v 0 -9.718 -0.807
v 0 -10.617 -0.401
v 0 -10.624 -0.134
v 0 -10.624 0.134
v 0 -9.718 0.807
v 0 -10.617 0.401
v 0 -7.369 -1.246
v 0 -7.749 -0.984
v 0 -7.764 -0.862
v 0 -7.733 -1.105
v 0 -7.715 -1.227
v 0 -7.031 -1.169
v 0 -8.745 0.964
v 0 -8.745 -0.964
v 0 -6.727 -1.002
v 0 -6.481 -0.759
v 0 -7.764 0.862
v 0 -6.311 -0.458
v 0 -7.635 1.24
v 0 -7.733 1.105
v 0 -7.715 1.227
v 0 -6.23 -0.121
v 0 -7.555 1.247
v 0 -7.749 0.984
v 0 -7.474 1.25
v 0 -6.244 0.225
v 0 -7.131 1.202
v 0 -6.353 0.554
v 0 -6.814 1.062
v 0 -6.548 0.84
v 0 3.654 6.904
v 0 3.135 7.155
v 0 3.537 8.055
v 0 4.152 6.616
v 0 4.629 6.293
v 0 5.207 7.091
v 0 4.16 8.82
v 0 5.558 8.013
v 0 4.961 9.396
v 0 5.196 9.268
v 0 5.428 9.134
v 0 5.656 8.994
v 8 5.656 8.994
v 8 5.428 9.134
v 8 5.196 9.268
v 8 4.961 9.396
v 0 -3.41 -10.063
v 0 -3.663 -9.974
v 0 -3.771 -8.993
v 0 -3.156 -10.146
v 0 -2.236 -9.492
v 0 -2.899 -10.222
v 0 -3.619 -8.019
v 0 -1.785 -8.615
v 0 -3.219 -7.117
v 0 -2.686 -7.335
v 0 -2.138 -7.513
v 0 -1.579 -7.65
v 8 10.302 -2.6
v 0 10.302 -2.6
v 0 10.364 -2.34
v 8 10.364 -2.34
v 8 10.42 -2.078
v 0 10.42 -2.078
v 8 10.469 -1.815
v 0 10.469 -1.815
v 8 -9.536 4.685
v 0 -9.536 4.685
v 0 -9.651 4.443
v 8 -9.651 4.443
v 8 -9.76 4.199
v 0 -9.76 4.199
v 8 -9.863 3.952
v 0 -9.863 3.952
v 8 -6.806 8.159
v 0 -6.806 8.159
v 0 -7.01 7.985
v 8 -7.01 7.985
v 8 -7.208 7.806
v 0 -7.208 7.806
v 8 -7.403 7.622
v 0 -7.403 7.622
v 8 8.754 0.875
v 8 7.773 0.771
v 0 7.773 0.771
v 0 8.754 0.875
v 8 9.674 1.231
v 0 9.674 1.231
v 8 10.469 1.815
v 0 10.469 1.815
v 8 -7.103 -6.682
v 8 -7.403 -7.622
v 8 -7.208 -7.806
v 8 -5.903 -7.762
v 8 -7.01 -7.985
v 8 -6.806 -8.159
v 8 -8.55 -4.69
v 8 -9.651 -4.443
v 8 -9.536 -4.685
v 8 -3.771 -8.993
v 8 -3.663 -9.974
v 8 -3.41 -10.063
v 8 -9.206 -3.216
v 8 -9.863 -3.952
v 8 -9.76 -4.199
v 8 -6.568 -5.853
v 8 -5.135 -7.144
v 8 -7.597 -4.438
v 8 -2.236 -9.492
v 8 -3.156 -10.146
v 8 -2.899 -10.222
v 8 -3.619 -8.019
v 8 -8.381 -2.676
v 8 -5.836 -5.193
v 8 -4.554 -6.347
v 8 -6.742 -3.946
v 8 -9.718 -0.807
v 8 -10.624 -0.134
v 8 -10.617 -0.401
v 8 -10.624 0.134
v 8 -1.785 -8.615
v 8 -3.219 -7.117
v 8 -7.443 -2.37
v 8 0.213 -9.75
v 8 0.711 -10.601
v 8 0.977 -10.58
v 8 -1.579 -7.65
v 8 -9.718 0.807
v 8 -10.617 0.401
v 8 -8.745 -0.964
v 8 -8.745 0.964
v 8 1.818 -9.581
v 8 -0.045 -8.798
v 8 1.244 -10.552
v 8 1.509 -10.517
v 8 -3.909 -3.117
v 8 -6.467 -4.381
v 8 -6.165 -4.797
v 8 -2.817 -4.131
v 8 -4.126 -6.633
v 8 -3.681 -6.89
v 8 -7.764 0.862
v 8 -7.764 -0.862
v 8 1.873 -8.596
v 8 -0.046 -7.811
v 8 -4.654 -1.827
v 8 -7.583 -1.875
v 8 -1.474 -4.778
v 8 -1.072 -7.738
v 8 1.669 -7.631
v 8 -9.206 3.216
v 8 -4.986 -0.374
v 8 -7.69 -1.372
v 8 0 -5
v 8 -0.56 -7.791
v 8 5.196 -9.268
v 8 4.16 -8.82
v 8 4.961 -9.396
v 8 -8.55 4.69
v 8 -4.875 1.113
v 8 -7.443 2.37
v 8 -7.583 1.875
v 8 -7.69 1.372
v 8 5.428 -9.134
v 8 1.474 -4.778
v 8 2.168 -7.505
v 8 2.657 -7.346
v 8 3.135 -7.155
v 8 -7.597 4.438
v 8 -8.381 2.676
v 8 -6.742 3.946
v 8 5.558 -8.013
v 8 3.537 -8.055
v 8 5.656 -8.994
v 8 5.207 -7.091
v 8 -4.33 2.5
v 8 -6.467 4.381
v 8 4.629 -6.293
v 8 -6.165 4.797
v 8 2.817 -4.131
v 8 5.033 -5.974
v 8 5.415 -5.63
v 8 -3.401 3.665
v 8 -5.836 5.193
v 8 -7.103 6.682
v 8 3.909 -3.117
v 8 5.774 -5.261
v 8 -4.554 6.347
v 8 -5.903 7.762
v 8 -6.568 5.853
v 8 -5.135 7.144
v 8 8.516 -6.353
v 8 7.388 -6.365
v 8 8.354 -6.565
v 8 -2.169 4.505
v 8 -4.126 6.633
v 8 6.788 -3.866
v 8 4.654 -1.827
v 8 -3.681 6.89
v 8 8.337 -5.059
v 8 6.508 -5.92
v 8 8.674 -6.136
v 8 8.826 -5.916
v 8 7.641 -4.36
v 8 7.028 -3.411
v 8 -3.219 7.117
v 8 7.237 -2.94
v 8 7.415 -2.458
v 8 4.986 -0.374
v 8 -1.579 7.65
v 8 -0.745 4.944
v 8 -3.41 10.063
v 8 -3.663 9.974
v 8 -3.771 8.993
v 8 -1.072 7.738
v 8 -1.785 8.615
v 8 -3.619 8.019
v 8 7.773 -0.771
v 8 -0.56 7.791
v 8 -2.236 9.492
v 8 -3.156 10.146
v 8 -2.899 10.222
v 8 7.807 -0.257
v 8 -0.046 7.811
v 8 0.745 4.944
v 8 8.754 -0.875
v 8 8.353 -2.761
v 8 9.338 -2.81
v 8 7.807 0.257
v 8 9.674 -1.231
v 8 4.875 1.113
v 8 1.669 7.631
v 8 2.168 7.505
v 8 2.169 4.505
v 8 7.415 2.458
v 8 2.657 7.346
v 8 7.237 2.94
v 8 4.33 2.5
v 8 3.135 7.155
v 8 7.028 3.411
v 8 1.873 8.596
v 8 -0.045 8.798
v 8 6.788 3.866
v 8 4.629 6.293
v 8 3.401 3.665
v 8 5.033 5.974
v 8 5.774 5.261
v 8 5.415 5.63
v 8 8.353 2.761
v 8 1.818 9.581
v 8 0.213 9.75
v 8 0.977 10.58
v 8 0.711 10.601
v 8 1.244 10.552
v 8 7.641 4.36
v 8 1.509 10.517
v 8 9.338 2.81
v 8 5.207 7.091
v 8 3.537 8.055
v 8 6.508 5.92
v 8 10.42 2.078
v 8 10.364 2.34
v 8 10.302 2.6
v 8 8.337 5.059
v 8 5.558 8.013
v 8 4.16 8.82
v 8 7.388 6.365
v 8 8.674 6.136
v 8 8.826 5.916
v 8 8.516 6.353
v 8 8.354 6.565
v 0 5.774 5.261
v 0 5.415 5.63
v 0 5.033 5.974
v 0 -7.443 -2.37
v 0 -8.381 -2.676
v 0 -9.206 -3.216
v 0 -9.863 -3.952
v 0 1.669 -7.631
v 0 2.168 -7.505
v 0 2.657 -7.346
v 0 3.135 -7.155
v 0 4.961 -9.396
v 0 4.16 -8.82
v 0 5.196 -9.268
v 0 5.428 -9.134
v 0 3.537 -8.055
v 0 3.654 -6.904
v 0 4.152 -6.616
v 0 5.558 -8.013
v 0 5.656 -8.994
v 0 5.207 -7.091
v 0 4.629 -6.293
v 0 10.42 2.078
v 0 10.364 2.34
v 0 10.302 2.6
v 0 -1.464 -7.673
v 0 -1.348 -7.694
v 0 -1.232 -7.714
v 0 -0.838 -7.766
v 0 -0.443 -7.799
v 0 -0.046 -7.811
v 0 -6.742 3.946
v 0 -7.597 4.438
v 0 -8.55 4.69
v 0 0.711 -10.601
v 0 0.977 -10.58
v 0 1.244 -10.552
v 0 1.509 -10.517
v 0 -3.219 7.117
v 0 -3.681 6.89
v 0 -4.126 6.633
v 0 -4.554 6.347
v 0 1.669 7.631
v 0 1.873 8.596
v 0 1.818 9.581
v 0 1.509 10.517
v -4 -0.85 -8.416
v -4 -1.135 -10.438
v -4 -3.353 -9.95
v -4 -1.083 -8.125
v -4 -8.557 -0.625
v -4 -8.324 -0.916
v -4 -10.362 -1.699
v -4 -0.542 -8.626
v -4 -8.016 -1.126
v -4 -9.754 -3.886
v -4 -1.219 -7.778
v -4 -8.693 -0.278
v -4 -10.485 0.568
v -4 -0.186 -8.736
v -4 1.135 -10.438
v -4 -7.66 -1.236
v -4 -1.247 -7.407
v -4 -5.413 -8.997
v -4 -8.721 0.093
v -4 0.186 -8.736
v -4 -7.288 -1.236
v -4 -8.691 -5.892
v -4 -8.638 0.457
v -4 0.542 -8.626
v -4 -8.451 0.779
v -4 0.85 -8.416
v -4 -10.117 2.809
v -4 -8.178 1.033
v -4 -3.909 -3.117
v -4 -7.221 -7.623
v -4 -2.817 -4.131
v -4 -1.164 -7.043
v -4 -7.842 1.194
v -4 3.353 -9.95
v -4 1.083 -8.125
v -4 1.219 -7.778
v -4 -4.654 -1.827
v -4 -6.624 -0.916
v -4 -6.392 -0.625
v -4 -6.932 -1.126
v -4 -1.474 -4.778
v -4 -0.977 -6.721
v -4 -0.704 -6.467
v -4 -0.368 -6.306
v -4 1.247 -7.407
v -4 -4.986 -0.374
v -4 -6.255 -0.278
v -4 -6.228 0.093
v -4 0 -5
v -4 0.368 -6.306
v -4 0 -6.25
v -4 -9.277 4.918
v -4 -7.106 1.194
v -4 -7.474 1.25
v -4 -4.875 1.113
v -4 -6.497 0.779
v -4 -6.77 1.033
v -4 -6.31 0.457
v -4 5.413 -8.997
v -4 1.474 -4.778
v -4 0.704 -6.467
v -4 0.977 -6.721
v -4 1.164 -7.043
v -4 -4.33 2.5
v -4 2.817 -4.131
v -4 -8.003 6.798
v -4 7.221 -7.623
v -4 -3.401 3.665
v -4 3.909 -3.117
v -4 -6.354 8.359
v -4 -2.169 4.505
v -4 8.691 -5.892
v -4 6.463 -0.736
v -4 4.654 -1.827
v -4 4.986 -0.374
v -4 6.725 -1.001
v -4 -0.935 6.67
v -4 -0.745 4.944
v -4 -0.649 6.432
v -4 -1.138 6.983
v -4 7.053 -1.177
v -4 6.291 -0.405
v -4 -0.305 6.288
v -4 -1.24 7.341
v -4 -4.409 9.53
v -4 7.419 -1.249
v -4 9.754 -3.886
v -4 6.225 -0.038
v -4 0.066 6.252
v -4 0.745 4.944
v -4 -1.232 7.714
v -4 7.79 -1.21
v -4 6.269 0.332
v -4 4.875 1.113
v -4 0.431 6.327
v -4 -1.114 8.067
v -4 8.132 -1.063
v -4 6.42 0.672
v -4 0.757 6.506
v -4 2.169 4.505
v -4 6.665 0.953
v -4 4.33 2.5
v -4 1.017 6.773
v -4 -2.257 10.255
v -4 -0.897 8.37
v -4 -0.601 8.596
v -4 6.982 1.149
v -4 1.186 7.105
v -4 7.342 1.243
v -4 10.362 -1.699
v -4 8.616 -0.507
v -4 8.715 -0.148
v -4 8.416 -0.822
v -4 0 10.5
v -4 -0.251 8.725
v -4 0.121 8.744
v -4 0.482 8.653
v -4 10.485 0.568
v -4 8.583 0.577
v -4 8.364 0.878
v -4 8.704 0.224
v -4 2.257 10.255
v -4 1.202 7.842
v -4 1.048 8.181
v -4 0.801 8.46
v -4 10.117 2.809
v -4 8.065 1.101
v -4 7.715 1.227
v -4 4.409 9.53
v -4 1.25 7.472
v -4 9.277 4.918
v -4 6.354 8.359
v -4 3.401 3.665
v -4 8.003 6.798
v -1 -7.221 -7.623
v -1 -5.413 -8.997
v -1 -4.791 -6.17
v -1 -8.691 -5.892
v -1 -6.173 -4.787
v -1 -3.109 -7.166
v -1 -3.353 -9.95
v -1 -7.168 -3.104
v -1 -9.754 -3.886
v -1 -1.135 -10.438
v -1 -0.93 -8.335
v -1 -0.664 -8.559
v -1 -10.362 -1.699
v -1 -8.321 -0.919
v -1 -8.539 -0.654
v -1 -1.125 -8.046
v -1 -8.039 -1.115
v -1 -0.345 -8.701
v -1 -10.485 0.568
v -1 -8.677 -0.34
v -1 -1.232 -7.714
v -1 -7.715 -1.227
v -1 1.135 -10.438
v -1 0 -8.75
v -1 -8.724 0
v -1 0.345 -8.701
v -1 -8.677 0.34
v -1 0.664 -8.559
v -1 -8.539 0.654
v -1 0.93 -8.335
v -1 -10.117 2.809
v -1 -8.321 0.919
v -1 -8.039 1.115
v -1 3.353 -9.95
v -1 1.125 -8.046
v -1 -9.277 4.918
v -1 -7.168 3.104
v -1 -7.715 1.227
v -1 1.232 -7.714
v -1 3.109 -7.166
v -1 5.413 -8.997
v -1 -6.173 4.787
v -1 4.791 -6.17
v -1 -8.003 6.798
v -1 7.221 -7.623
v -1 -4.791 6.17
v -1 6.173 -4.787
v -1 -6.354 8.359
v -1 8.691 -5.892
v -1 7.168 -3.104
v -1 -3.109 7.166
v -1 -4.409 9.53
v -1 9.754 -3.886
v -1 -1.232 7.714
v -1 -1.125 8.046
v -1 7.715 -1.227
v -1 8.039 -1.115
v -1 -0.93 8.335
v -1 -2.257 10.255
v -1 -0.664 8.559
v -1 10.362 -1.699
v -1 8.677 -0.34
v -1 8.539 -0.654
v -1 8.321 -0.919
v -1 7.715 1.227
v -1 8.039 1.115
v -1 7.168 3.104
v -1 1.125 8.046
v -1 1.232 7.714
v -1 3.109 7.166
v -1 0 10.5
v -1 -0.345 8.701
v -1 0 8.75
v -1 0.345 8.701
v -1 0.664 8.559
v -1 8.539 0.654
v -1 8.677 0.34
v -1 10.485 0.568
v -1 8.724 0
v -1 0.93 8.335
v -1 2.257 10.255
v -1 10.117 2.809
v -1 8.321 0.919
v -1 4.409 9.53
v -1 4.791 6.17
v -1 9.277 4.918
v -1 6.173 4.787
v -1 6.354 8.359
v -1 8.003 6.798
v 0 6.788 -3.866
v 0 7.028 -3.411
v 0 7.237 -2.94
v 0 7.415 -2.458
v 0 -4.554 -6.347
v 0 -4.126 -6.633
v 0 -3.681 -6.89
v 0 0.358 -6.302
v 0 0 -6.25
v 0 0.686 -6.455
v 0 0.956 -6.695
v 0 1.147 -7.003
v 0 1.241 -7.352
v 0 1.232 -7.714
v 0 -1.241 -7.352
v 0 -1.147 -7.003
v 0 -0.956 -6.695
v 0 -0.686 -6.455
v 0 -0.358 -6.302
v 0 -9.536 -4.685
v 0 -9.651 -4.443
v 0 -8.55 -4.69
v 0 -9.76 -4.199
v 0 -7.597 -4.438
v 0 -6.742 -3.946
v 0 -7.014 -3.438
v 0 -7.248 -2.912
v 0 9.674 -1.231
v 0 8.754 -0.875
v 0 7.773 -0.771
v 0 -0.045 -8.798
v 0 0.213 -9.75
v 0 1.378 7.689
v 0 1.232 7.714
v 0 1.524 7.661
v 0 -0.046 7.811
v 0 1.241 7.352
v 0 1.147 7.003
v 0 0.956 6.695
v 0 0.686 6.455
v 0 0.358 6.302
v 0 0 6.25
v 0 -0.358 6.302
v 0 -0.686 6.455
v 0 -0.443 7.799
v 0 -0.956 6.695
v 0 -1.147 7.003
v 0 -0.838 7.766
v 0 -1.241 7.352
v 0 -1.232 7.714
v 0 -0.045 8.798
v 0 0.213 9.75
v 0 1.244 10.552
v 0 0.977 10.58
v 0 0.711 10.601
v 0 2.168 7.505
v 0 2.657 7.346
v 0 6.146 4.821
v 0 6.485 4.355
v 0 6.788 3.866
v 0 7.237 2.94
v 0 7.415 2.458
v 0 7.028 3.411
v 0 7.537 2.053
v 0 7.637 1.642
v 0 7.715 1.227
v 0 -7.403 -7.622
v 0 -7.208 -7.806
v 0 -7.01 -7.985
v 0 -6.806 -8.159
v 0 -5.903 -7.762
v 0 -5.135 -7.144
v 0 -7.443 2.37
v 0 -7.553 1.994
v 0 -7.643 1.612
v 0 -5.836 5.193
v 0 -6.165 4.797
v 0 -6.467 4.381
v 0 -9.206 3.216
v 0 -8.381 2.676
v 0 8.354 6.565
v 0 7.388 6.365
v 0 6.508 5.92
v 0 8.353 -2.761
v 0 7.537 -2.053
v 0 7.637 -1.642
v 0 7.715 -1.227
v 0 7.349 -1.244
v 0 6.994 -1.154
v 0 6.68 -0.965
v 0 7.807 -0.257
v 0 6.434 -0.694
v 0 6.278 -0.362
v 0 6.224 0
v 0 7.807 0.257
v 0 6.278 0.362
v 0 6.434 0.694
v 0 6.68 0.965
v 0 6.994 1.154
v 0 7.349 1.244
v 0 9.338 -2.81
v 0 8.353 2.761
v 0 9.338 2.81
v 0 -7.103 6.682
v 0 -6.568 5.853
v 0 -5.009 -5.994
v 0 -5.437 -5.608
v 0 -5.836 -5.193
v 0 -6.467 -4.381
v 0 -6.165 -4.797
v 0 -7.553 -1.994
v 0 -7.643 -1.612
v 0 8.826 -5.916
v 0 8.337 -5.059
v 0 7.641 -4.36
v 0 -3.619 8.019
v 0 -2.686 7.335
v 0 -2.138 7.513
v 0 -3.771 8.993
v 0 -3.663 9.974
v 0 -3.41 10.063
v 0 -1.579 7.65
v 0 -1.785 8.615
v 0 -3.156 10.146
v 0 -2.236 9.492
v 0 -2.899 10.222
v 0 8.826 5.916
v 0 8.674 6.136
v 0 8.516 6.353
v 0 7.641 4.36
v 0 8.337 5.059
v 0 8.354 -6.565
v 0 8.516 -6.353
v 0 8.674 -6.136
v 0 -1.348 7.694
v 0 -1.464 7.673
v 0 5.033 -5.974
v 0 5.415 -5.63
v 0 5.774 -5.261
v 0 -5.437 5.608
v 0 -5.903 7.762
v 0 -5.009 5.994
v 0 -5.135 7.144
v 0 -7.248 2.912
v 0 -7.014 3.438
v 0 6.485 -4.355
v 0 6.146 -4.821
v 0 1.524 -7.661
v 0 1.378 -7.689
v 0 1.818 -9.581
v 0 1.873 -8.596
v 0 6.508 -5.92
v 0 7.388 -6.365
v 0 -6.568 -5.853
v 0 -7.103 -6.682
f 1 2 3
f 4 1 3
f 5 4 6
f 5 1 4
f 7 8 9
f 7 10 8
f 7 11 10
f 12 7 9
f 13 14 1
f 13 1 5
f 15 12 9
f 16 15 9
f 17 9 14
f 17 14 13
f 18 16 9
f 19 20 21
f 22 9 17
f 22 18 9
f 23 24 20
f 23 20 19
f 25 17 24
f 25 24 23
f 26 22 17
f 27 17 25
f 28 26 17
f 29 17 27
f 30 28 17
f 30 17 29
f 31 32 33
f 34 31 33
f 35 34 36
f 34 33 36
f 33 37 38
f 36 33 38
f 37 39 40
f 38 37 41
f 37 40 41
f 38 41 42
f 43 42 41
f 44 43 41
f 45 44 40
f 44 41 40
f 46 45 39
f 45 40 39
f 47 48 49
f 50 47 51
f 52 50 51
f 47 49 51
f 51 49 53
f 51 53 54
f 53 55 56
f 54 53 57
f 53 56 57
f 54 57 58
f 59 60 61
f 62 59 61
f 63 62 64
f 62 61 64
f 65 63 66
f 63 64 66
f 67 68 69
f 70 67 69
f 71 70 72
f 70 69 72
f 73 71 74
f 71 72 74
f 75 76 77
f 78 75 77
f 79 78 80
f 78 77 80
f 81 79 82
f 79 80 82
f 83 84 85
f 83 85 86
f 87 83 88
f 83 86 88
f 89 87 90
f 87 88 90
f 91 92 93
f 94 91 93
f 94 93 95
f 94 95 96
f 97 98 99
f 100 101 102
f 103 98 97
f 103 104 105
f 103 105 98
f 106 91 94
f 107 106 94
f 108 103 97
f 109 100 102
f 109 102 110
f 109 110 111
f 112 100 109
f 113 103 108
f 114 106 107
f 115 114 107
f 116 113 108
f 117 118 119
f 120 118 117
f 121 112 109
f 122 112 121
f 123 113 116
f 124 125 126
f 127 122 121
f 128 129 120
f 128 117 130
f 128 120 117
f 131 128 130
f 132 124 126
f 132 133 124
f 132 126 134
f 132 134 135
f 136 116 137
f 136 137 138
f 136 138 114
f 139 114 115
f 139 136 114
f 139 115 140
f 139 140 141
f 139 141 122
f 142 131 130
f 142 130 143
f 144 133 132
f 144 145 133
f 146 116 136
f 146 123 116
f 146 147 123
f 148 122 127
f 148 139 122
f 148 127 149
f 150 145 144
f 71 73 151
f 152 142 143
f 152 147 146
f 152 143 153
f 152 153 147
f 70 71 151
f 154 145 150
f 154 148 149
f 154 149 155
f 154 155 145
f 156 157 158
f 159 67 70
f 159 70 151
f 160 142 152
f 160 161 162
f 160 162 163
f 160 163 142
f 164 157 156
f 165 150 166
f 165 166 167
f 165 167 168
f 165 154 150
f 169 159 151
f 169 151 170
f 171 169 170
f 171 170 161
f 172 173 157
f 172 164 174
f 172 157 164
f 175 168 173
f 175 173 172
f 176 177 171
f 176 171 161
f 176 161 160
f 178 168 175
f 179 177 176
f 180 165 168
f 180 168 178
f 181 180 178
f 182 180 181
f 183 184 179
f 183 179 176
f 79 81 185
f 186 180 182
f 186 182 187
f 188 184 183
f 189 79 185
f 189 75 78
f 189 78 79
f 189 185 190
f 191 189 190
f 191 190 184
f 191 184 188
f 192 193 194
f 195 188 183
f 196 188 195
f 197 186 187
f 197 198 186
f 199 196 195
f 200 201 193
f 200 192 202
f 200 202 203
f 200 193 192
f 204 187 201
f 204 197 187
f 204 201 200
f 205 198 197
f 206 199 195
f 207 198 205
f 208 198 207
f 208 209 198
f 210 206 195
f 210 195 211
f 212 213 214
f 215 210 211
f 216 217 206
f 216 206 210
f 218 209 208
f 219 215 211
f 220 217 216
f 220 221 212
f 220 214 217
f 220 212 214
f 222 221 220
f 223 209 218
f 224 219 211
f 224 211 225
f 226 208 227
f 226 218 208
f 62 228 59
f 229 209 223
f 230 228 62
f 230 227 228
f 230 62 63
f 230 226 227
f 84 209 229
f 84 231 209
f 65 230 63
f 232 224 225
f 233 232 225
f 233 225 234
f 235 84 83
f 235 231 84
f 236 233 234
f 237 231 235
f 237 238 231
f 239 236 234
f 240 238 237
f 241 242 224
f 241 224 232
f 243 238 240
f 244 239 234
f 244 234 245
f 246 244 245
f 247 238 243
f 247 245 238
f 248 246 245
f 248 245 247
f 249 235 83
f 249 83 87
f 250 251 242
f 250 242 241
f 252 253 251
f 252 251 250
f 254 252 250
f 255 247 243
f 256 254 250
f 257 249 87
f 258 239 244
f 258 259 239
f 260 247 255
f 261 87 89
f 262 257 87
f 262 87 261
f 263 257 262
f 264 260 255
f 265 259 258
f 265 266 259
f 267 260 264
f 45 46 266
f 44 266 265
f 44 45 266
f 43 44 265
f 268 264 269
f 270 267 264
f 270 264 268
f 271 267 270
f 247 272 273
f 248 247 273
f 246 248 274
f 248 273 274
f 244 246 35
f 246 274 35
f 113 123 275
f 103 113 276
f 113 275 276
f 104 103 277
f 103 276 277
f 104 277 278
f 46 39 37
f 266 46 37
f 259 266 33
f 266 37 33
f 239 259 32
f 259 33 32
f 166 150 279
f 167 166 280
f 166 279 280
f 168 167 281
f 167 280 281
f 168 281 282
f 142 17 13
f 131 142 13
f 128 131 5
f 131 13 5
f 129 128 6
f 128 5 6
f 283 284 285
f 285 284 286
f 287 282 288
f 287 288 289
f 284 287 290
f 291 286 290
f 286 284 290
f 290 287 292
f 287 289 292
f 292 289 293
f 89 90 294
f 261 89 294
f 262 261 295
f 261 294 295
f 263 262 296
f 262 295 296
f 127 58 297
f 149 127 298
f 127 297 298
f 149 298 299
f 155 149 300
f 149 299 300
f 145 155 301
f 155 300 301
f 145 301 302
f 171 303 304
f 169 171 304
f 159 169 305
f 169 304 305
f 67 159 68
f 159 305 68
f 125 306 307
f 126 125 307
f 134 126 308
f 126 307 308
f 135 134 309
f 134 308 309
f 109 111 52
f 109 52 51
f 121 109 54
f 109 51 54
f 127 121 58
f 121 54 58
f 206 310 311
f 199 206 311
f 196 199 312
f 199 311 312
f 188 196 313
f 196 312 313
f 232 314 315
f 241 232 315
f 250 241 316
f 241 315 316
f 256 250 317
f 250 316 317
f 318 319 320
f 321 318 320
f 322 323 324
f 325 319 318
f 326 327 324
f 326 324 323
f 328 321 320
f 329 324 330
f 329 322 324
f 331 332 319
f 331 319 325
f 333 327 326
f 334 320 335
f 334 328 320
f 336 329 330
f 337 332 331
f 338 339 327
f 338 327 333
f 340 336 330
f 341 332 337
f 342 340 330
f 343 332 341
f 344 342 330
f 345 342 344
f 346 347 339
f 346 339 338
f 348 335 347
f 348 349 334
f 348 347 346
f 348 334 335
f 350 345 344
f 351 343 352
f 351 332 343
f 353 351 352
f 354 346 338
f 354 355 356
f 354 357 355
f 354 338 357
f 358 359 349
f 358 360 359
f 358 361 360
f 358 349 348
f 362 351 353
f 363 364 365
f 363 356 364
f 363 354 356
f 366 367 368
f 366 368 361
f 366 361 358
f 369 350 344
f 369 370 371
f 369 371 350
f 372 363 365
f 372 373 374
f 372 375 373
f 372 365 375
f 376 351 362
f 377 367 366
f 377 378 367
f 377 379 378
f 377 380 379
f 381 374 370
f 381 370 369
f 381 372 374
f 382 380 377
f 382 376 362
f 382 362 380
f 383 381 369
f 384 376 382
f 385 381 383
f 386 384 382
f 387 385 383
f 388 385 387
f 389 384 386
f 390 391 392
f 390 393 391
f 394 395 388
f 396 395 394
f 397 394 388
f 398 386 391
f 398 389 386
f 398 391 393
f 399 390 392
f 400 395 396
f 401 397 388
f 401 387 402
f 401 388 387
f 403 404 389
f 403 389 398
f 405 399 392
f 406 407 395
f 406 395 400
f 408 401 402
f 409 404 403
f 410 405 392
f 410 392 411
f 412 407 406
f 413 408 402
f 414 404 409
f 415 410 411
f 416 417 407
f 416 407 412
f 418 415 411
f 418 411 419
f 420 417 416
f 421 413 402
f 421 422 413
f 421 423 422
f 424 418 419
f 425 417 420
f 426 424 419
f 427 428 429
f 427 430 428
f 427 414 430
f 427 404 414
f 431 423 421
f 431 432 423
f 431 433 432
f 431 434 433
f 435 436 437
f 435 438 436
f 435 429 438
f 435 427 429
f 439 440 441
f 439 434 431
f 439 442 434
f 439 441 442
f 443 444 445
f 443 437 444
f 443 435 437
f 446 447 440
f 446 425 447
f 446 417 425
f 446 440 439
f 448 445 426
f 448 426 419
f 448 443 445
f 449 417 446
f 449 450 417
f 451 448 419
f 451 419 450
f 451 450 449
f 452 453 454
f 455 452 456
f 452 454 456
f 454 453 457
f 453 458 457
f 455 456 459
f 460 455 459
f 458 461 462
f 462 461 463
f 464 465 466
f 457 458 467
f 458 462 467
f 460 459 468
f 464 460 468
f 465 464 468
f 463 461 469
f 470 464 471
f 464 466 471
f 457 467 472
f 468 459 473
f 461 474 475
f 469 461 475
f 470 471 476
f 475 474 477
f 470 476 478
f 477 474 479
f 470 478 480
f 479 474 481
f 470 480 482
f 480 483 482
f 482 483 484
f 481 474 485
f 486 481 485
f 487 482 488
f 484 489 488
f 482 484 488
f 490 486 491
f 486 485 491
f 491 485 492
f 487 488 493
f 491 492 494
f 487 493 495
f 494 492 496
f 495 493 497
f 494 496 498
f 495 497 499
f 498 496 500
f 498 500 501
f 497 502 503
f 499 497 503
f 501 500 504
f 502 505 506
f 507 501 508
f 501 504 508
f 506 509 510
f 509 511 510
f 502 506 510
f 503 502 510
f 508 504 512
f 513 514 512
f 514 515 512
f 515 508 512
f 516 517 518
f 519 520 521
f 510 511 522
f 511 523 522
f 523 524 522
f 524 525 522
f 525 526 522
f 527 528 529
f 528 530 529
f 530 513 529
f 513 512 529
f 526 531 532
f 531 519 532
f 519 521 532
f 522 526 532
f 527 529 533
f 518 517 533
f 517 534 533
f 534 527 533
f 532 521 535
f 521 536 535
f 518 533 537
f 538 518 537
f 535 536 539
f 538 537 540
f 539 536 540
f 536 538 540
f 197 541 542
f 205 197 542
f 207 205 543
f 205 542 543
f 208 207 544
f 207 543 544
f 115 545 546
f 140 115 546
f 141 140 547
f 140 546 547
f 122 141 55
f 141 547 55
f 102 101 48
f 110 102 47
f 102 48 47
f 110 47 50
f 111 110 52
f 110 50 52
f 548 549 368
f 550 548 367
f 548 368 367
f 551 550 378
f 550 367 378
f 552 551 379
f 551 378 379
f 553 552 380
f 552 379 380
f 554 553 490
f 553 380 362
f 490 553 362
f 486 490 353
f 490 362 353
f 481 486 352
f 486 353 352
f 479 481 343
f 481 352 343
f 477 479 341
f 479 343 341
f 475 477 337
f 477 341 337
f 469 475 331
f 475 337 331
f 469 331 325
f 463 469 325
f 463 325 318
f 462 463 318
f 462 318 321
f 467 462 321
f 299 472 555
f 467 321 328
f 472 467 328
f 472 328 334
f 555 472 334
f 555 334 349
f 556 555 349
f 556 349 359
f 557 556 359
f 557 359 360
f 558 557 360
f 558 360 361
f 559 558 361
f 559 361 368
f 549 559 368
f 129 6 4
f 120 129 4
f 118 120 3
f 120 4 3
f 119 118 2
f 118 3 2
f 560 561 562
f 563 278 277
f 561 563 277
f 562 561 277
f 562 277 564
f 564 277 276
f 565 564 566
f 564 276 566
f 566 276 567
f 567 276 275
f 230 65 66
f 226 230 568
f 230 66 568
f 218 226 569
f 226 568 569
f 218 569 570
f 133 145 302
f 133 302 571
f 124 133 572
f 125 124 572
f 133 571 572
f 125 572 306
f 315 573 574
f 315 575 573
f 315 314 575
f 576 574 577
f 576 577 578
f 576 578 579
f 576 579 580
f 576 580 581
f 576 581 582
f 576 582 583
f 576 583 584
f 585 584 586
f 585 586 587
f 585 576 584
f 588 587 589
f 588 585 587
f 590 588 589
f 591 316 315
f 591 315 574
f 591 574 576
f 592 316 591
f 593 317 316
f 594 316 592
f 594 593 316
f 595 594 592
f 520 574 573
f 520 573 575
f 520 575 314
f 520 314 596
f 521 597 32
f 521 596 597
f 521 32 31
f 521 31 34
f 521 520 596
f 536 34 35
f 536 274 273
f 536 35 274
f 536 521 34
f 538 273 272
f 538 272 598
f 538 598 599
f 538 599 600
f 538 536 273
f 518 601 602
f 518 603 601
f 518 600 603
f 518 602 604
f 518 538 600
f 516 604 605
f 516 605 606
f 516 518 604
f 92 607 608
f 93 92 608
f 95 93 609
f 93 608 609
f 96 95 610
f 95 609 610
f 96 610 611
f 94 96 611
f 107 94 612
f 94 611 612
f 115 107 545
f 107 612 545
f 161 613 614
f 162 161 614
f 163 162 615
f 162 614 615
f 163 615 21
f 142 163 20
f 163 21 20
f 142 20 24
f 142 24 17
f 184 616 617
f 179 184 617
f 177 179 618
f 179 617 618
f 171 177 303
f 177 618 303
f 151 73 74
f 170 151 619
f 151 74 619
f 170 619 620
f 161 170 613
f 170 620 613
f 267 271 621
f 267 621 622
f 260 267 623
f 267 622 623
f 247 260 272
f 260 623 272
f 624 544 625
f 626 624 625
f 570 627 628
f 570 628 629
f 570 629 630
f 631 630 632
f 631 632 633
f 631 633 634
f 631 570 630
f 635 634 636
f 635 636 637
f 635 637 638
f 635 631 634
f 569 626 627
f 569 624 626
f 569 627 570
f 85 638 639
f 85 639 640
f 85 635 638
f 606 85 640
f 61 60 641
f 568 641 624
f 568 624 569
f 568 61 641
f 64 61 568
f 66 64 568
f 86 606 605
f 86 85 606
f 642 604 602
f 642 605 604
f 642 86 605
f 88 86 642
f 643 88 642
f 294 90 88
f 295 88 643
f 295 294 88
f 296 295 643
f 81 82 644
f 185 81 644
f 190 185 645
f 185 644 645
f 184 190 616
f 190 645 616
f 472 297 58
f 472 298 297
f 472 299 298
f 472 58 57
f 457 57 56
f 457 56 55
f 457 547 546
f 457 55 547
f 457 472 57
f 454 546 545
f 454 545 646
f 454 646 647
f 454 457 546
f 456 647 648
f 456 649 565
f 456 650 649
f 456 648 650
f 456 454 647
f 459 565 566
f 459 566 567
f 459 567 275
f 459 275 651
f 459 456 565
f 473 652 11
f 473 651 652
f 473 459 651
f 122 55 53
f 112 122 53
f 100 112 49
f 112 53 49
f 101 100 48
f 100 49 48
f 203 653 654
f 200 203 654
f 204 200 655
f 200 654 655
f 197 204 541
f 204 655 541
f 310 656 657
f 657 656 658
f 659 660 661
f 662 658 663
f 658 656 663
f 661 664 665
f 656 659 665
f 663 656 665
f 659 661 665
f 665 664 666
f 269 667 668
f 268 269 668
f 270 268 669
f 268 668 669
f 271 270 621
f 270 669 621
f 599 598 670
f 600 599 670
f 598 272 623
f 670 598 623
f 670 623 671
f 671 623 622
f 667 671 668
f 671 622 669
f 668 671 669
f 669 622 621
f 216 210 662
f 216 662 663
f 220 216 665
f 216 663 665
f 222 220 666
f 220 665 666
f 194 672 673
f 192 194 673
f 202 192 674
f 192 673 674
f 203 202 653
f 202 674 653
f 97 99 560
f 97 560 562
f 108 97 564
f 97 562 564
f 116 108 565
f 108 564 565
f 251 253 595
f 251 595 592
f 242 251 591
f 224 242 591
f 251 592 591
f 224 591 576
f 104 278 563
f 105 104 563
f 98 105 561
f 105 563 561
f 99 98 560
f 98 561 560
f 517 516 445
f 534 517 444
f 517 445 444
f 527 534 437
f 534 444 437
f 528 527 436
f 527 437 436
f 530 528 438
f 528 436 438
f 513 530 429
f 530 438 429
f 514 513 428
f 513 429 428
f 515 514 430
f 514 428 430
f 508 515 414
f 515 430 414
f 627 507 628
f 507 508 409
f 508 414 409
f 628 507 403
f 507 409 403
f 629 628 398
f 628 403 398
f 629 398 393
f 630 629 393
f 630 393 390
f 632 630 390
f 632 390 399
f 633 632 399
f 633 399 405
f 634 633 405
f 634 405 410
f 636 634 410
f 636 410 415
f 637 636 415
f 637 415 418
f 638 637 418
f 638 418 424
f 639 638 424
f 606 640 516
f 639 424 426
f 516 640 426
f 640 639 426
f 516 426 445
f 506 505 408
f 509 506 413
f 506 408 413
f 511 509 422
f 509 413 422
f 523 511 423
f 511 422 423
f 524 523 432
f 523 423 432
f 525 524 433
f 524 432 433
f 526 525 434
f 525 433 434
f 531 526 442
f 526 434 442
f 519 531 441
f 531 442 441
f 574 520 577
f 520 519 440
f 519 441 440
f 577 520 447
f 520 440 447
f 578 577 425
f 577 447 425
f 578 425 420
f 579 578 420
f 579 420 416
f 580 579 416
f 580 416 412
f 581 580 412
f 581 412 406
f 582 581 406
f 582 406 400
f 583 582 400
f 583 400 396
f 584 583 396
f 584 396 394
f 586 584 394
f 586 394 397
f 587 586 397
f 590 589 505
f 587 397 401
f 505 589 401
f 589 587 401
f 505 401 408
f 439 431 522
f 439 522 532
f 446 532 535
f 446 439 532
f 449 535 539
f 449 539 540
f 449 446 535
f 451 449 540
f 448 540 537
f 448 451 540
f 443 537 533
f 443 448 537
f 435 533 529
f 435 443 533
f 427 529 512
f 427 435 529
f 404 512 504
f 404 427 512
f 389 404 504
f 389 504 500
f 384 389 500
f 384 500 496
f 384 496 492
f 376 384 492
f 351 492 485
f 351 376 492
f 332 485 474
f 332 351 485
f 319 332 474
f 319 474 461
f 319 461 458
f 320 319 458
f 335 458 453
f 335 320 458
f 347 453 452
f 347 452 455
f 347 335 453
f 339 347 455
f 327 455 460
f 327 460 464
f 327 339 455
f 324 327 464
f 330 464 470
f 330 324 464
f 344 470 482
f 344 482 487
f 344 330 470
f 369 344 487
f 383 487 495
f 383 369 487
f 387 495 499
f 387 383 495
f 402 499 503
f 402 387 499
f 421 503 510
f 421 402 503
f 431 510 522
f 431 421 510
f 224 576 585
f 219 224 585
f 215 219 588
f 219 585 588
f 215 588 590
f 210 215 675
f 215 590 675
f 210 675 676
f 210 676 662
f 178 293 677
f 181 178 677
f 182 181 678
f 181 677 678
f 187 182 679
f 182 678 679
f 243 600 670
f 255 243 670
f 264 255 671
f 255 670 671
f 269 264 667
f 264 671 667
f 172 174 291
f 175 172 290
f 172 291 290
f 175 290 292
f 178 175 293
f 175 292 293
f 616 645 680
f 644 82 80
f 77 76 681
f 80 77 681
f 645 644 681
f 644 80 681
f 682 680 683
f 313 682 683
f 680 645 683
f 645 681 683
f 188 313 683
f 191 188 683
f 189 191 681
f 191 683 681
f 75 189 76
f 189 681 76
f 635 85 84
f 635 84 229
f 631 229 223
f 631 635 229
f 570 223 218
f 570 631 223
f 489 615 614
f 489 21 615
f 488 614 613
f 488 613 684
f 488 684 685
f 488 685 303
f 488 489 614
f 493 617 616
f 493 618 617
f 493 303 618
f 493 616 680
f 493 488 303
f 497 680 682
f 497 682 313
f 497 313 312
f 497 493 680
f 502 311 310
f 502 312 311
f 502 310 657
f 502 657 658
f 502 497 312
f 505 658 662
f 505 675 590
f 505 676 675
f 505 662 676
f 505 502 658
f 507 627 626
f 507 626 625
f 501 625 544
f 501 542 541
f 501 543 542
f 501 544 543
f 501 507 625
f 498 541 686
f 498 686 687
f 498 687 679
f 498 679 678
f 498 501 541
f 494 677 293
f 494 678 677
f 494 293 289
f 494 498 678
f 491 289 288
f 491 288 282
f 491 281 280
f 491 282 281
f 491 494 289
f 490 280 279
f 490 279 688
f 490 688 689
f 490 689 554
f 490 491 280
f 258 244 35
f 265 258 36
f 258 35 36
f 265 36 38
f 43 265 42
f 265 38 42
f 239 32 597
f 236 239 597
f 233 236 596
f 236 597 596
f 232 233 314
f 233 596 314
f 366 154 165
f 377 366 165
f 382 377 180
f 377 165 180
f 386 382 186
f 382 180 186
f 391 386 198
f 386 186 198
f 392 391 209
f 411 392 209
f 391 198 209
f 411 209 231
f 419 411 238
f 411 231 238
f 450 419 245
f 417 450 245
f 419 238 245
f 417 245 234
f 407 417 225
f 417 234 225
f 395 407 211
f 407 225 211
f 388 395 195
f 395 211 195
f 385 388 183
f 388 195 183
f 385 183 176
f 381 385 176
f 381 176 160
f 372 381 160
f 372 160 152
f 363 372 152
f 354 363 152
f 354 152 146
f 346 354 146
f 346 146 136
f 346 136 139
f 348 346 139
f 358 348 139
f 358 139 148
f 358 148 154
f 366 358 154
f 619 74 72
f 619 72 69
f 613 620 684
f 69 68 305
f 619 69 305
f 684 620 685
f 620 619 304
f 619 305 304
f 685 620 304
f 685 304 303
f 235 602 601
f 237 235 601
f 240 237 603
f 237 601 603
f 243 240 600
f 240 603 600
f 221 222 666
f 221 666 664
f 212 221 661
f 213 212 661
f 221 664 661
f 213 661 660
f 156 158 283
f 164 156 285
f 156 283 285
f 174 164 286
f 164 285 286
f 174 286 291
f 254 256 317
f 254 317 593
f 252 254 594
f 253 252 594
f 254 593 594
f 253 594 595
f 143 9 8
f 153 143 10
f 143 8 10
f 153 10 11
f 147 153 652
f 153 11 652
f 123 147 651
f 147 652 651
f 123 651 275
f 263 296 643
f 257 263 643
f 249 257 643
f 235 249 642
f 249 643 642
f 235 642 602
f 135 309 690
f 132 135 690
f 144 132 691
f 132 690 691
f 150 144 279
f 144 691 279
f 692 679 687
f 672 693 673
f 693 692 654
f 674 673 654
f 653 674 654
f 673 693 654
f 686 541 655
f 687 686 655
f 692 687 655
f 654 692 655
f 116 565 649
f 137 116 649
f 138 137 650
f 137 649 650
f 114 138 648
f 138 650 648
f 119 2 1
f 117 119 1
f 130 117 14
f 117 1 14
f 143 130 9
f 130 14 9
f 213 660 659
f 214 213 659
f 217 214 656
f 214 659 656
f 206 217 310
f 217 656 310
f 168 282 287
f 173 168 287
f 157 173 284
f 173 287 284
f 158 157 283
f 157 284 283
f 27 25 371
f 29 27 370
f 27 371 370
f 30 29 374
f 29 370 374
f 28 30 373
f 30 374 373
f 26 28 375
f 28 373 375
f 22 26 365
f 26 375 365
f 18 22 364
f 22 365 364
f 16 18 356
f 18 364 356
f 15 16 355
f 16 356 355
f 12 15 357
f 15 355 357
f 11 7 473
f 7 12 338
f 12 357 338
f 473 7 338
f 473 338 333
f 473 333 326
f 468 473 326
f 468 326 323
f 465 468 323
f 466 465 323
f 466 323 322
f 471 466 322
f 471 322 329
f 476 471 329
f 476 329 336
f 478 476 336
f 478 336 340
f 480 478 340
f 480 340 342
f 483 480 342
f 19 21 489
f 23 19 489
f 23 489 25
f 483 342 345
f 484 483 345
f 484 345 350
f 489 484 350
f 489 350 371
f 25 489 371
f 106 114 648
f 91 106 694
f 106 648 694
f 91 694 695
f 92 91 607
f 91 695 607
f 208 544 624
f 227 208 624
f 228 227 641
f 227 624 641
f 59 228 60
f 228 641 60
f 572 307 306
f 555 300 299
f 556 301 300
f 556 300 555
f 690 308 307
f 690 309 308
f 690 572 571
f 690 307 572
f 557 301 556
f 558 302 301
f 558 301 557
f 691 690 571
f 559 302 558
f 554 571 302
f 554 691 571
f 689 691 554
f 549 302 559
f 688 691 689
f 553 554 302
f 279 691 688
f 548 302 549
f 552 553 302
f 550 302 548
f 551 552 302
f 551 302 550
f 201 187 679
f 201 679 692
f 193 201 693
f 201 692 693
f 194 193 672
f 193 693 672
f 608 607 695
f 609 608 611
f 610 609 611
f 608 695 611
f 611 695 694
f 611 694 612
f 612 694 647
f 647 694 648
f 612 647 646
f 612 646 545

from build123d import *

# Parameters (mm, degrees)
OTHER_269_OUTLINE_R = 2.5
OTHER_269_DEPTH     = 8
EXTRUDE_START       = 4
SKETCH_1_R          = 7.8115
EXTRUDE_1_DEPTH     = 4
SKETCH_2_R          = 10.5
EXTRUDE_2_DEPTH     = 3
SKETCH_3_R          = 5
CUT_EXTRUDE_1_DEPTH = 18
SKETCH_4_R          = 1.25
CUT_EXTRUDE_2_DEPTH = 4


# Read off the part's stored shape, not the designer's step: звезда к рейки
with BuildPart() as part:
    # Other 269 outline → Other 269 (new body)
    with BuildSketch(Plane.YZ):
        with BuildLine():
            ThreePointArc((1.50889806, 10.517311997), (1.110614922, 10.566795138), (0.710747103, 10.601201043))
            ThreePointArc((0.710747103, 10.601201043), (0.052768817, 9.282126803), (-0.045978646, 7.811364683))
            ThreePointArc((-0.045978646, 7.811364683), (-0.816524091, 7.768707786), (-1.579100136, 7.650227121))
            ThreePointArc((-1.579100136, 7.650227121), (-1.98147837, 9.068318808), (-2.899329207, 10.221766733))
            ThreePointArc((-2.899329207, 10.221766733), (-3.283305565, 10.104975486), (-3.662597137, 9.973765949))
            ThreePointArc((-3.662597137, 9.973765949), (-3.727174383, 8.50110779), (-3.219171833, 7.117335524))
            ThreePointArc((-3.219171833, 7.117335524), (-3.90575, 6.764957442), (-4.554207455, 6.346552348))
            ThreePointArc((-4.554207455, 6.346552348), (-5.498588115, 7.478381595), (-6.806236115, 8.158785139))
            ThreePointArc((-6.806236115, 8.158785139), (-7.109512693, 7.895913771), (-7.402645059, 7.621776114))
            ThreePointArc((-7.402645059, 7.621776114), (-6.862655273, 6.250170009), (-5.835740964, 5.192654394))
            ThreePointArc((-5.835740964, 5.192654394), (-6.319636252, 4.591484498), (-6.741850931, 3.945501017))
            ThreePointArc((-6.741850931, 3.945501017), (-8.064942021, 4.595364266), (-9.536282966, 4.685075474))
            ThreePointArc((-9.536282966, 4.685075474), (-9.706420487, 4.321576832), (-9.862708399, 3.951911947))
            ThreePointArc((-9.862708399, 3.951911947), (-8.81152072, 2.918521053), (-7.443257466, 2.370116145))
            ThreePointArc((-7.443257466, 2.370116145), (-7.640799983, 1.624102173), (-7.763767133, 0.862236717))
            ThreePointArc((-7.763767133, 0.862236717), (-9.236794185, 0.917766707), (-10.617419857, 0.401273697))
            ThreePointArc((-10.617419857, 0.401273697), (-10.625, 0), (-10.617419857, -0.401273697))
            ThreePointArc((-10.617419857, -0.401273697), (-9.236794185, -0.917766707), (-7.763767133, -0.862236717))
            ThreePointArc((-7.763767133, -0.862236717), (-7.640799983, -1.624102173), (-7.443257466, -2.370116145))
            ThreePointArc((-7.443257466, -2.370116145), (-8.81152072, -2.918521053), (-9.862708399, -3.951911947))
            ThreePointArc((-9.862708399, -3.951911947), (-9.706420487, -4.321576832), (-9.536282966, -4.685075474))
            ThreePointArc((-9.536282966, -4.685075474), (-8.064942021, -4.595364266), (-6.741850931, -3.945501017))
            ThreePointArc((-6.741850931, -3.945501017), (-6.319636252, -4.591484498), (-5.835740964, -5.192654394))
            ThreePointArc((-5.835740964, -5.192654394), (-6.862655273, -6.250170009), (-7.402645059, -7.621776114))
            ThreePointArc((-7.402645059, -7.621776114), (-7.109512693, -7.895913771), (-6.806236115, -8.158785139))
            ThreePointArc((-6.806236115, -8.158785139), (-5.498588115, -7.478381595), (-4.554207455, -6.346552348))
            ThreePointArc((-4.554207455, -6.346552348), (-3.90575, -6.764957442), (-3.219171833, -7.117335524))
            ThreePointArc((-3.219171833, -7.117335524), (-3.727174383, -8.50110779), (-3.662597137, -9.973765949))
            ThreePointArc((-3.662597137, -9.973765949), (-3.283305565, -10.104975486), (-2.899329207, -10.221766733))
            ThreePointArc((-2.899329207, -10.221766733), (-1.98147837, -9.068318808), (-1.579100136, -7.650227121))
            ThreePointArc((-1.579100136, -7.650227121), (-0.816524091, -7.768707786), (-0.045978646, -7.811364683))
            ThreePointArc((-0.045978646, -7.811364683), (0.052768817, -9.282126803), (0.710747103, -10.601201043))
            ThreePointArc((0.710747103, -10.601201043), (1.110614922, -10.566795138), (1.50889806, -10.517311997))
            ThreePointArc((1.50889806, -10.517311997), (1.878246986, -9.090261316), (1.669047941, -7.631108125))
            ThreePointArc((1.669047941, -7.631108125), (2.413886252, -7.429177977), (3.135164666, -7.154737925))
            ThreePointArc((3.135164666, -7.154737925), (3.82358781, -8.458181767), (4.961196713, -9.395592168))
            ThreePointArc((4.961196713, -9.395592168), (5.3125, -9.201519915), (5.656223144, -8.99431847))
            ThreePointArc((5.656223144, -8.99431847), (5.413206375, -7.54041506), (4.628602467, -6.292501208))
            ThreePointArc((4.628602467, -6.292501208), (5.226913732, -5.805075804), (5.774209525, -5.26099198))
            ThreePointArc((5.774209525, -5.26099198), (6.933273734, -6.171740263), (8.353810339, -6.56540005))
            ThreePointArc((8.353810339, -6.56540005), (8.595805565, -6.245218306), (8.825535862, -5.916125569))
            ThreePointArc((8.825535862, -5.916125569), (8.012173204, -4.686762538), (6.787829577, -3.865863666))
            ThreePointArc((6.787829577, -3.865863666), (7.136160342, -3.177223287), (7.4148411, -2.457572728))
            ThreePointArc((7.4148411, -2.457572728), (8.844133643, -2.818148799), (10.301974266, -2.599990619))
            ThreePointArc((10.301974266, -2.599990619), (10.392818258, -2.209061715), (10.468833252, -1.81498081))
            ThreePointArc((10.468833252, -1.81498081), (9.225762498, -1.022726195), (7.773379287, -0.770783176))
            ThreePointArc((7.773379287, -0.770783176), (7.8115, 0), (7.773379287, 0.770783176))
            ThreePointArc((7.773379287, 0.770783176), (9.225762498, 1.022726195), (10.468833252, 1.81498081))
            ThreePointArc((10.468833252, 1.81498081), (10.392818258, 2.209061715), (10.301974266, 2.599990619))
            ThreePointArc((10.301974266, 2.599990619), (8.844133643, 2.818148799), (7.4148411, 2.457572728))
            ThreePointArc((7.4148411, 2.457572728), (7.136160342, 3.177223287), (6.787829577, 3.865863666))
            ThreePointArc((6.787829577, 3.865863666), (8.012173204, 4.686762538), (8.825535862, 5.916125569))
            ThreePointArc((8.825535862, 5.916125569), (8.595805565, 6.245218306), (8.353810339, 6.56540005))
            ThreePointArc((8.353810339, 6.56540005), (6.933273734, 6.171740263), (5.774209525, 5.26099198))
            ThreePointArc((5.774209525, 5.26099198), (5.226913732, 5.805075804), (4.628602467, 6.292501208))
            ThreePointArc((4.628602467, 6.292501208), (5.413206375, 7.54041506), (5.656223144, 8.99431847))
            ThreePointArc((5.656223144, 8.99431847), (5.3125, 9.201519915), (4.961196713, 9.395592168))
            ThreePointArc((4.961196713, 9.395592168), (3.82358781, 8.458181767), (3.135164666, 7.154737925))
            ThreePointArc((3.135164666, 7.154737925), (2.413886252, 7.429177977), (1.669047941, 7.631108125))
            ThreePointArc((1.669047941, 7.631108125), (1.878246986, 9.090261316), (1.50889806, 10.517311997))
        make_face()
        Circle(OTHER_269_OUTLINE_R, mode=Mode.SUBTRACT)
    extrude(amount=OTHER_269_DEPTH)

    # Эскиз1 → Бобышка-Вытянуть1 (add)
    with BuildSketch(Plane.ZY.offset(EXTRUDE_START)):
        Circle(SKETCH_1_R)
    extrude(amount=-EXTRUDE_1_DEPTH)

    # Эскиз2 → Бобышка-Вытянуть2 (add)
    with BuildSketch(Plane.ZY.offset(4)):
        Circle(SKETCH_2_R)
    extrude(amount=-EXTRUDE_2_DEPTH)

    # Эскиз3 → Вырез-Вытянуть1 (cut)
    with BuildSketch(Plane(origin=(8, 0, 0), x_dir=(0, 0, -1), z_dir=(1, 0, 0))):
        Circle(SKETCH_3_R)
    extrude(amount=-CUT_EXTRUDE_1_DEPTH, mode=Mode.SUBTRACT)

    # Эскиз4 → Вырез-Вытянуть2 (cut)
    with BuildSketch(Plane.ZY.offset(4)):
        with Locations((-7.5, 0)):
            Circle(SKETCH_4_R)
        with Locations((0, -7.474046633)):
            Circle(SKETCH_4_R)
        with Locations(Location((7.5, 0, 0), (0, 0, 279.848392372))):
            Circle(SKETCH_4_R)
        with Locations(Location((0, 7.474046633, 0), (0, 0, 11.094887122))):
            Circle(SKETCH_4_R)
    extrude(amount=-CUT_EXTRUDE_2_DEPTH, mode=Mode.SUBTRACT)


solid = part.part
